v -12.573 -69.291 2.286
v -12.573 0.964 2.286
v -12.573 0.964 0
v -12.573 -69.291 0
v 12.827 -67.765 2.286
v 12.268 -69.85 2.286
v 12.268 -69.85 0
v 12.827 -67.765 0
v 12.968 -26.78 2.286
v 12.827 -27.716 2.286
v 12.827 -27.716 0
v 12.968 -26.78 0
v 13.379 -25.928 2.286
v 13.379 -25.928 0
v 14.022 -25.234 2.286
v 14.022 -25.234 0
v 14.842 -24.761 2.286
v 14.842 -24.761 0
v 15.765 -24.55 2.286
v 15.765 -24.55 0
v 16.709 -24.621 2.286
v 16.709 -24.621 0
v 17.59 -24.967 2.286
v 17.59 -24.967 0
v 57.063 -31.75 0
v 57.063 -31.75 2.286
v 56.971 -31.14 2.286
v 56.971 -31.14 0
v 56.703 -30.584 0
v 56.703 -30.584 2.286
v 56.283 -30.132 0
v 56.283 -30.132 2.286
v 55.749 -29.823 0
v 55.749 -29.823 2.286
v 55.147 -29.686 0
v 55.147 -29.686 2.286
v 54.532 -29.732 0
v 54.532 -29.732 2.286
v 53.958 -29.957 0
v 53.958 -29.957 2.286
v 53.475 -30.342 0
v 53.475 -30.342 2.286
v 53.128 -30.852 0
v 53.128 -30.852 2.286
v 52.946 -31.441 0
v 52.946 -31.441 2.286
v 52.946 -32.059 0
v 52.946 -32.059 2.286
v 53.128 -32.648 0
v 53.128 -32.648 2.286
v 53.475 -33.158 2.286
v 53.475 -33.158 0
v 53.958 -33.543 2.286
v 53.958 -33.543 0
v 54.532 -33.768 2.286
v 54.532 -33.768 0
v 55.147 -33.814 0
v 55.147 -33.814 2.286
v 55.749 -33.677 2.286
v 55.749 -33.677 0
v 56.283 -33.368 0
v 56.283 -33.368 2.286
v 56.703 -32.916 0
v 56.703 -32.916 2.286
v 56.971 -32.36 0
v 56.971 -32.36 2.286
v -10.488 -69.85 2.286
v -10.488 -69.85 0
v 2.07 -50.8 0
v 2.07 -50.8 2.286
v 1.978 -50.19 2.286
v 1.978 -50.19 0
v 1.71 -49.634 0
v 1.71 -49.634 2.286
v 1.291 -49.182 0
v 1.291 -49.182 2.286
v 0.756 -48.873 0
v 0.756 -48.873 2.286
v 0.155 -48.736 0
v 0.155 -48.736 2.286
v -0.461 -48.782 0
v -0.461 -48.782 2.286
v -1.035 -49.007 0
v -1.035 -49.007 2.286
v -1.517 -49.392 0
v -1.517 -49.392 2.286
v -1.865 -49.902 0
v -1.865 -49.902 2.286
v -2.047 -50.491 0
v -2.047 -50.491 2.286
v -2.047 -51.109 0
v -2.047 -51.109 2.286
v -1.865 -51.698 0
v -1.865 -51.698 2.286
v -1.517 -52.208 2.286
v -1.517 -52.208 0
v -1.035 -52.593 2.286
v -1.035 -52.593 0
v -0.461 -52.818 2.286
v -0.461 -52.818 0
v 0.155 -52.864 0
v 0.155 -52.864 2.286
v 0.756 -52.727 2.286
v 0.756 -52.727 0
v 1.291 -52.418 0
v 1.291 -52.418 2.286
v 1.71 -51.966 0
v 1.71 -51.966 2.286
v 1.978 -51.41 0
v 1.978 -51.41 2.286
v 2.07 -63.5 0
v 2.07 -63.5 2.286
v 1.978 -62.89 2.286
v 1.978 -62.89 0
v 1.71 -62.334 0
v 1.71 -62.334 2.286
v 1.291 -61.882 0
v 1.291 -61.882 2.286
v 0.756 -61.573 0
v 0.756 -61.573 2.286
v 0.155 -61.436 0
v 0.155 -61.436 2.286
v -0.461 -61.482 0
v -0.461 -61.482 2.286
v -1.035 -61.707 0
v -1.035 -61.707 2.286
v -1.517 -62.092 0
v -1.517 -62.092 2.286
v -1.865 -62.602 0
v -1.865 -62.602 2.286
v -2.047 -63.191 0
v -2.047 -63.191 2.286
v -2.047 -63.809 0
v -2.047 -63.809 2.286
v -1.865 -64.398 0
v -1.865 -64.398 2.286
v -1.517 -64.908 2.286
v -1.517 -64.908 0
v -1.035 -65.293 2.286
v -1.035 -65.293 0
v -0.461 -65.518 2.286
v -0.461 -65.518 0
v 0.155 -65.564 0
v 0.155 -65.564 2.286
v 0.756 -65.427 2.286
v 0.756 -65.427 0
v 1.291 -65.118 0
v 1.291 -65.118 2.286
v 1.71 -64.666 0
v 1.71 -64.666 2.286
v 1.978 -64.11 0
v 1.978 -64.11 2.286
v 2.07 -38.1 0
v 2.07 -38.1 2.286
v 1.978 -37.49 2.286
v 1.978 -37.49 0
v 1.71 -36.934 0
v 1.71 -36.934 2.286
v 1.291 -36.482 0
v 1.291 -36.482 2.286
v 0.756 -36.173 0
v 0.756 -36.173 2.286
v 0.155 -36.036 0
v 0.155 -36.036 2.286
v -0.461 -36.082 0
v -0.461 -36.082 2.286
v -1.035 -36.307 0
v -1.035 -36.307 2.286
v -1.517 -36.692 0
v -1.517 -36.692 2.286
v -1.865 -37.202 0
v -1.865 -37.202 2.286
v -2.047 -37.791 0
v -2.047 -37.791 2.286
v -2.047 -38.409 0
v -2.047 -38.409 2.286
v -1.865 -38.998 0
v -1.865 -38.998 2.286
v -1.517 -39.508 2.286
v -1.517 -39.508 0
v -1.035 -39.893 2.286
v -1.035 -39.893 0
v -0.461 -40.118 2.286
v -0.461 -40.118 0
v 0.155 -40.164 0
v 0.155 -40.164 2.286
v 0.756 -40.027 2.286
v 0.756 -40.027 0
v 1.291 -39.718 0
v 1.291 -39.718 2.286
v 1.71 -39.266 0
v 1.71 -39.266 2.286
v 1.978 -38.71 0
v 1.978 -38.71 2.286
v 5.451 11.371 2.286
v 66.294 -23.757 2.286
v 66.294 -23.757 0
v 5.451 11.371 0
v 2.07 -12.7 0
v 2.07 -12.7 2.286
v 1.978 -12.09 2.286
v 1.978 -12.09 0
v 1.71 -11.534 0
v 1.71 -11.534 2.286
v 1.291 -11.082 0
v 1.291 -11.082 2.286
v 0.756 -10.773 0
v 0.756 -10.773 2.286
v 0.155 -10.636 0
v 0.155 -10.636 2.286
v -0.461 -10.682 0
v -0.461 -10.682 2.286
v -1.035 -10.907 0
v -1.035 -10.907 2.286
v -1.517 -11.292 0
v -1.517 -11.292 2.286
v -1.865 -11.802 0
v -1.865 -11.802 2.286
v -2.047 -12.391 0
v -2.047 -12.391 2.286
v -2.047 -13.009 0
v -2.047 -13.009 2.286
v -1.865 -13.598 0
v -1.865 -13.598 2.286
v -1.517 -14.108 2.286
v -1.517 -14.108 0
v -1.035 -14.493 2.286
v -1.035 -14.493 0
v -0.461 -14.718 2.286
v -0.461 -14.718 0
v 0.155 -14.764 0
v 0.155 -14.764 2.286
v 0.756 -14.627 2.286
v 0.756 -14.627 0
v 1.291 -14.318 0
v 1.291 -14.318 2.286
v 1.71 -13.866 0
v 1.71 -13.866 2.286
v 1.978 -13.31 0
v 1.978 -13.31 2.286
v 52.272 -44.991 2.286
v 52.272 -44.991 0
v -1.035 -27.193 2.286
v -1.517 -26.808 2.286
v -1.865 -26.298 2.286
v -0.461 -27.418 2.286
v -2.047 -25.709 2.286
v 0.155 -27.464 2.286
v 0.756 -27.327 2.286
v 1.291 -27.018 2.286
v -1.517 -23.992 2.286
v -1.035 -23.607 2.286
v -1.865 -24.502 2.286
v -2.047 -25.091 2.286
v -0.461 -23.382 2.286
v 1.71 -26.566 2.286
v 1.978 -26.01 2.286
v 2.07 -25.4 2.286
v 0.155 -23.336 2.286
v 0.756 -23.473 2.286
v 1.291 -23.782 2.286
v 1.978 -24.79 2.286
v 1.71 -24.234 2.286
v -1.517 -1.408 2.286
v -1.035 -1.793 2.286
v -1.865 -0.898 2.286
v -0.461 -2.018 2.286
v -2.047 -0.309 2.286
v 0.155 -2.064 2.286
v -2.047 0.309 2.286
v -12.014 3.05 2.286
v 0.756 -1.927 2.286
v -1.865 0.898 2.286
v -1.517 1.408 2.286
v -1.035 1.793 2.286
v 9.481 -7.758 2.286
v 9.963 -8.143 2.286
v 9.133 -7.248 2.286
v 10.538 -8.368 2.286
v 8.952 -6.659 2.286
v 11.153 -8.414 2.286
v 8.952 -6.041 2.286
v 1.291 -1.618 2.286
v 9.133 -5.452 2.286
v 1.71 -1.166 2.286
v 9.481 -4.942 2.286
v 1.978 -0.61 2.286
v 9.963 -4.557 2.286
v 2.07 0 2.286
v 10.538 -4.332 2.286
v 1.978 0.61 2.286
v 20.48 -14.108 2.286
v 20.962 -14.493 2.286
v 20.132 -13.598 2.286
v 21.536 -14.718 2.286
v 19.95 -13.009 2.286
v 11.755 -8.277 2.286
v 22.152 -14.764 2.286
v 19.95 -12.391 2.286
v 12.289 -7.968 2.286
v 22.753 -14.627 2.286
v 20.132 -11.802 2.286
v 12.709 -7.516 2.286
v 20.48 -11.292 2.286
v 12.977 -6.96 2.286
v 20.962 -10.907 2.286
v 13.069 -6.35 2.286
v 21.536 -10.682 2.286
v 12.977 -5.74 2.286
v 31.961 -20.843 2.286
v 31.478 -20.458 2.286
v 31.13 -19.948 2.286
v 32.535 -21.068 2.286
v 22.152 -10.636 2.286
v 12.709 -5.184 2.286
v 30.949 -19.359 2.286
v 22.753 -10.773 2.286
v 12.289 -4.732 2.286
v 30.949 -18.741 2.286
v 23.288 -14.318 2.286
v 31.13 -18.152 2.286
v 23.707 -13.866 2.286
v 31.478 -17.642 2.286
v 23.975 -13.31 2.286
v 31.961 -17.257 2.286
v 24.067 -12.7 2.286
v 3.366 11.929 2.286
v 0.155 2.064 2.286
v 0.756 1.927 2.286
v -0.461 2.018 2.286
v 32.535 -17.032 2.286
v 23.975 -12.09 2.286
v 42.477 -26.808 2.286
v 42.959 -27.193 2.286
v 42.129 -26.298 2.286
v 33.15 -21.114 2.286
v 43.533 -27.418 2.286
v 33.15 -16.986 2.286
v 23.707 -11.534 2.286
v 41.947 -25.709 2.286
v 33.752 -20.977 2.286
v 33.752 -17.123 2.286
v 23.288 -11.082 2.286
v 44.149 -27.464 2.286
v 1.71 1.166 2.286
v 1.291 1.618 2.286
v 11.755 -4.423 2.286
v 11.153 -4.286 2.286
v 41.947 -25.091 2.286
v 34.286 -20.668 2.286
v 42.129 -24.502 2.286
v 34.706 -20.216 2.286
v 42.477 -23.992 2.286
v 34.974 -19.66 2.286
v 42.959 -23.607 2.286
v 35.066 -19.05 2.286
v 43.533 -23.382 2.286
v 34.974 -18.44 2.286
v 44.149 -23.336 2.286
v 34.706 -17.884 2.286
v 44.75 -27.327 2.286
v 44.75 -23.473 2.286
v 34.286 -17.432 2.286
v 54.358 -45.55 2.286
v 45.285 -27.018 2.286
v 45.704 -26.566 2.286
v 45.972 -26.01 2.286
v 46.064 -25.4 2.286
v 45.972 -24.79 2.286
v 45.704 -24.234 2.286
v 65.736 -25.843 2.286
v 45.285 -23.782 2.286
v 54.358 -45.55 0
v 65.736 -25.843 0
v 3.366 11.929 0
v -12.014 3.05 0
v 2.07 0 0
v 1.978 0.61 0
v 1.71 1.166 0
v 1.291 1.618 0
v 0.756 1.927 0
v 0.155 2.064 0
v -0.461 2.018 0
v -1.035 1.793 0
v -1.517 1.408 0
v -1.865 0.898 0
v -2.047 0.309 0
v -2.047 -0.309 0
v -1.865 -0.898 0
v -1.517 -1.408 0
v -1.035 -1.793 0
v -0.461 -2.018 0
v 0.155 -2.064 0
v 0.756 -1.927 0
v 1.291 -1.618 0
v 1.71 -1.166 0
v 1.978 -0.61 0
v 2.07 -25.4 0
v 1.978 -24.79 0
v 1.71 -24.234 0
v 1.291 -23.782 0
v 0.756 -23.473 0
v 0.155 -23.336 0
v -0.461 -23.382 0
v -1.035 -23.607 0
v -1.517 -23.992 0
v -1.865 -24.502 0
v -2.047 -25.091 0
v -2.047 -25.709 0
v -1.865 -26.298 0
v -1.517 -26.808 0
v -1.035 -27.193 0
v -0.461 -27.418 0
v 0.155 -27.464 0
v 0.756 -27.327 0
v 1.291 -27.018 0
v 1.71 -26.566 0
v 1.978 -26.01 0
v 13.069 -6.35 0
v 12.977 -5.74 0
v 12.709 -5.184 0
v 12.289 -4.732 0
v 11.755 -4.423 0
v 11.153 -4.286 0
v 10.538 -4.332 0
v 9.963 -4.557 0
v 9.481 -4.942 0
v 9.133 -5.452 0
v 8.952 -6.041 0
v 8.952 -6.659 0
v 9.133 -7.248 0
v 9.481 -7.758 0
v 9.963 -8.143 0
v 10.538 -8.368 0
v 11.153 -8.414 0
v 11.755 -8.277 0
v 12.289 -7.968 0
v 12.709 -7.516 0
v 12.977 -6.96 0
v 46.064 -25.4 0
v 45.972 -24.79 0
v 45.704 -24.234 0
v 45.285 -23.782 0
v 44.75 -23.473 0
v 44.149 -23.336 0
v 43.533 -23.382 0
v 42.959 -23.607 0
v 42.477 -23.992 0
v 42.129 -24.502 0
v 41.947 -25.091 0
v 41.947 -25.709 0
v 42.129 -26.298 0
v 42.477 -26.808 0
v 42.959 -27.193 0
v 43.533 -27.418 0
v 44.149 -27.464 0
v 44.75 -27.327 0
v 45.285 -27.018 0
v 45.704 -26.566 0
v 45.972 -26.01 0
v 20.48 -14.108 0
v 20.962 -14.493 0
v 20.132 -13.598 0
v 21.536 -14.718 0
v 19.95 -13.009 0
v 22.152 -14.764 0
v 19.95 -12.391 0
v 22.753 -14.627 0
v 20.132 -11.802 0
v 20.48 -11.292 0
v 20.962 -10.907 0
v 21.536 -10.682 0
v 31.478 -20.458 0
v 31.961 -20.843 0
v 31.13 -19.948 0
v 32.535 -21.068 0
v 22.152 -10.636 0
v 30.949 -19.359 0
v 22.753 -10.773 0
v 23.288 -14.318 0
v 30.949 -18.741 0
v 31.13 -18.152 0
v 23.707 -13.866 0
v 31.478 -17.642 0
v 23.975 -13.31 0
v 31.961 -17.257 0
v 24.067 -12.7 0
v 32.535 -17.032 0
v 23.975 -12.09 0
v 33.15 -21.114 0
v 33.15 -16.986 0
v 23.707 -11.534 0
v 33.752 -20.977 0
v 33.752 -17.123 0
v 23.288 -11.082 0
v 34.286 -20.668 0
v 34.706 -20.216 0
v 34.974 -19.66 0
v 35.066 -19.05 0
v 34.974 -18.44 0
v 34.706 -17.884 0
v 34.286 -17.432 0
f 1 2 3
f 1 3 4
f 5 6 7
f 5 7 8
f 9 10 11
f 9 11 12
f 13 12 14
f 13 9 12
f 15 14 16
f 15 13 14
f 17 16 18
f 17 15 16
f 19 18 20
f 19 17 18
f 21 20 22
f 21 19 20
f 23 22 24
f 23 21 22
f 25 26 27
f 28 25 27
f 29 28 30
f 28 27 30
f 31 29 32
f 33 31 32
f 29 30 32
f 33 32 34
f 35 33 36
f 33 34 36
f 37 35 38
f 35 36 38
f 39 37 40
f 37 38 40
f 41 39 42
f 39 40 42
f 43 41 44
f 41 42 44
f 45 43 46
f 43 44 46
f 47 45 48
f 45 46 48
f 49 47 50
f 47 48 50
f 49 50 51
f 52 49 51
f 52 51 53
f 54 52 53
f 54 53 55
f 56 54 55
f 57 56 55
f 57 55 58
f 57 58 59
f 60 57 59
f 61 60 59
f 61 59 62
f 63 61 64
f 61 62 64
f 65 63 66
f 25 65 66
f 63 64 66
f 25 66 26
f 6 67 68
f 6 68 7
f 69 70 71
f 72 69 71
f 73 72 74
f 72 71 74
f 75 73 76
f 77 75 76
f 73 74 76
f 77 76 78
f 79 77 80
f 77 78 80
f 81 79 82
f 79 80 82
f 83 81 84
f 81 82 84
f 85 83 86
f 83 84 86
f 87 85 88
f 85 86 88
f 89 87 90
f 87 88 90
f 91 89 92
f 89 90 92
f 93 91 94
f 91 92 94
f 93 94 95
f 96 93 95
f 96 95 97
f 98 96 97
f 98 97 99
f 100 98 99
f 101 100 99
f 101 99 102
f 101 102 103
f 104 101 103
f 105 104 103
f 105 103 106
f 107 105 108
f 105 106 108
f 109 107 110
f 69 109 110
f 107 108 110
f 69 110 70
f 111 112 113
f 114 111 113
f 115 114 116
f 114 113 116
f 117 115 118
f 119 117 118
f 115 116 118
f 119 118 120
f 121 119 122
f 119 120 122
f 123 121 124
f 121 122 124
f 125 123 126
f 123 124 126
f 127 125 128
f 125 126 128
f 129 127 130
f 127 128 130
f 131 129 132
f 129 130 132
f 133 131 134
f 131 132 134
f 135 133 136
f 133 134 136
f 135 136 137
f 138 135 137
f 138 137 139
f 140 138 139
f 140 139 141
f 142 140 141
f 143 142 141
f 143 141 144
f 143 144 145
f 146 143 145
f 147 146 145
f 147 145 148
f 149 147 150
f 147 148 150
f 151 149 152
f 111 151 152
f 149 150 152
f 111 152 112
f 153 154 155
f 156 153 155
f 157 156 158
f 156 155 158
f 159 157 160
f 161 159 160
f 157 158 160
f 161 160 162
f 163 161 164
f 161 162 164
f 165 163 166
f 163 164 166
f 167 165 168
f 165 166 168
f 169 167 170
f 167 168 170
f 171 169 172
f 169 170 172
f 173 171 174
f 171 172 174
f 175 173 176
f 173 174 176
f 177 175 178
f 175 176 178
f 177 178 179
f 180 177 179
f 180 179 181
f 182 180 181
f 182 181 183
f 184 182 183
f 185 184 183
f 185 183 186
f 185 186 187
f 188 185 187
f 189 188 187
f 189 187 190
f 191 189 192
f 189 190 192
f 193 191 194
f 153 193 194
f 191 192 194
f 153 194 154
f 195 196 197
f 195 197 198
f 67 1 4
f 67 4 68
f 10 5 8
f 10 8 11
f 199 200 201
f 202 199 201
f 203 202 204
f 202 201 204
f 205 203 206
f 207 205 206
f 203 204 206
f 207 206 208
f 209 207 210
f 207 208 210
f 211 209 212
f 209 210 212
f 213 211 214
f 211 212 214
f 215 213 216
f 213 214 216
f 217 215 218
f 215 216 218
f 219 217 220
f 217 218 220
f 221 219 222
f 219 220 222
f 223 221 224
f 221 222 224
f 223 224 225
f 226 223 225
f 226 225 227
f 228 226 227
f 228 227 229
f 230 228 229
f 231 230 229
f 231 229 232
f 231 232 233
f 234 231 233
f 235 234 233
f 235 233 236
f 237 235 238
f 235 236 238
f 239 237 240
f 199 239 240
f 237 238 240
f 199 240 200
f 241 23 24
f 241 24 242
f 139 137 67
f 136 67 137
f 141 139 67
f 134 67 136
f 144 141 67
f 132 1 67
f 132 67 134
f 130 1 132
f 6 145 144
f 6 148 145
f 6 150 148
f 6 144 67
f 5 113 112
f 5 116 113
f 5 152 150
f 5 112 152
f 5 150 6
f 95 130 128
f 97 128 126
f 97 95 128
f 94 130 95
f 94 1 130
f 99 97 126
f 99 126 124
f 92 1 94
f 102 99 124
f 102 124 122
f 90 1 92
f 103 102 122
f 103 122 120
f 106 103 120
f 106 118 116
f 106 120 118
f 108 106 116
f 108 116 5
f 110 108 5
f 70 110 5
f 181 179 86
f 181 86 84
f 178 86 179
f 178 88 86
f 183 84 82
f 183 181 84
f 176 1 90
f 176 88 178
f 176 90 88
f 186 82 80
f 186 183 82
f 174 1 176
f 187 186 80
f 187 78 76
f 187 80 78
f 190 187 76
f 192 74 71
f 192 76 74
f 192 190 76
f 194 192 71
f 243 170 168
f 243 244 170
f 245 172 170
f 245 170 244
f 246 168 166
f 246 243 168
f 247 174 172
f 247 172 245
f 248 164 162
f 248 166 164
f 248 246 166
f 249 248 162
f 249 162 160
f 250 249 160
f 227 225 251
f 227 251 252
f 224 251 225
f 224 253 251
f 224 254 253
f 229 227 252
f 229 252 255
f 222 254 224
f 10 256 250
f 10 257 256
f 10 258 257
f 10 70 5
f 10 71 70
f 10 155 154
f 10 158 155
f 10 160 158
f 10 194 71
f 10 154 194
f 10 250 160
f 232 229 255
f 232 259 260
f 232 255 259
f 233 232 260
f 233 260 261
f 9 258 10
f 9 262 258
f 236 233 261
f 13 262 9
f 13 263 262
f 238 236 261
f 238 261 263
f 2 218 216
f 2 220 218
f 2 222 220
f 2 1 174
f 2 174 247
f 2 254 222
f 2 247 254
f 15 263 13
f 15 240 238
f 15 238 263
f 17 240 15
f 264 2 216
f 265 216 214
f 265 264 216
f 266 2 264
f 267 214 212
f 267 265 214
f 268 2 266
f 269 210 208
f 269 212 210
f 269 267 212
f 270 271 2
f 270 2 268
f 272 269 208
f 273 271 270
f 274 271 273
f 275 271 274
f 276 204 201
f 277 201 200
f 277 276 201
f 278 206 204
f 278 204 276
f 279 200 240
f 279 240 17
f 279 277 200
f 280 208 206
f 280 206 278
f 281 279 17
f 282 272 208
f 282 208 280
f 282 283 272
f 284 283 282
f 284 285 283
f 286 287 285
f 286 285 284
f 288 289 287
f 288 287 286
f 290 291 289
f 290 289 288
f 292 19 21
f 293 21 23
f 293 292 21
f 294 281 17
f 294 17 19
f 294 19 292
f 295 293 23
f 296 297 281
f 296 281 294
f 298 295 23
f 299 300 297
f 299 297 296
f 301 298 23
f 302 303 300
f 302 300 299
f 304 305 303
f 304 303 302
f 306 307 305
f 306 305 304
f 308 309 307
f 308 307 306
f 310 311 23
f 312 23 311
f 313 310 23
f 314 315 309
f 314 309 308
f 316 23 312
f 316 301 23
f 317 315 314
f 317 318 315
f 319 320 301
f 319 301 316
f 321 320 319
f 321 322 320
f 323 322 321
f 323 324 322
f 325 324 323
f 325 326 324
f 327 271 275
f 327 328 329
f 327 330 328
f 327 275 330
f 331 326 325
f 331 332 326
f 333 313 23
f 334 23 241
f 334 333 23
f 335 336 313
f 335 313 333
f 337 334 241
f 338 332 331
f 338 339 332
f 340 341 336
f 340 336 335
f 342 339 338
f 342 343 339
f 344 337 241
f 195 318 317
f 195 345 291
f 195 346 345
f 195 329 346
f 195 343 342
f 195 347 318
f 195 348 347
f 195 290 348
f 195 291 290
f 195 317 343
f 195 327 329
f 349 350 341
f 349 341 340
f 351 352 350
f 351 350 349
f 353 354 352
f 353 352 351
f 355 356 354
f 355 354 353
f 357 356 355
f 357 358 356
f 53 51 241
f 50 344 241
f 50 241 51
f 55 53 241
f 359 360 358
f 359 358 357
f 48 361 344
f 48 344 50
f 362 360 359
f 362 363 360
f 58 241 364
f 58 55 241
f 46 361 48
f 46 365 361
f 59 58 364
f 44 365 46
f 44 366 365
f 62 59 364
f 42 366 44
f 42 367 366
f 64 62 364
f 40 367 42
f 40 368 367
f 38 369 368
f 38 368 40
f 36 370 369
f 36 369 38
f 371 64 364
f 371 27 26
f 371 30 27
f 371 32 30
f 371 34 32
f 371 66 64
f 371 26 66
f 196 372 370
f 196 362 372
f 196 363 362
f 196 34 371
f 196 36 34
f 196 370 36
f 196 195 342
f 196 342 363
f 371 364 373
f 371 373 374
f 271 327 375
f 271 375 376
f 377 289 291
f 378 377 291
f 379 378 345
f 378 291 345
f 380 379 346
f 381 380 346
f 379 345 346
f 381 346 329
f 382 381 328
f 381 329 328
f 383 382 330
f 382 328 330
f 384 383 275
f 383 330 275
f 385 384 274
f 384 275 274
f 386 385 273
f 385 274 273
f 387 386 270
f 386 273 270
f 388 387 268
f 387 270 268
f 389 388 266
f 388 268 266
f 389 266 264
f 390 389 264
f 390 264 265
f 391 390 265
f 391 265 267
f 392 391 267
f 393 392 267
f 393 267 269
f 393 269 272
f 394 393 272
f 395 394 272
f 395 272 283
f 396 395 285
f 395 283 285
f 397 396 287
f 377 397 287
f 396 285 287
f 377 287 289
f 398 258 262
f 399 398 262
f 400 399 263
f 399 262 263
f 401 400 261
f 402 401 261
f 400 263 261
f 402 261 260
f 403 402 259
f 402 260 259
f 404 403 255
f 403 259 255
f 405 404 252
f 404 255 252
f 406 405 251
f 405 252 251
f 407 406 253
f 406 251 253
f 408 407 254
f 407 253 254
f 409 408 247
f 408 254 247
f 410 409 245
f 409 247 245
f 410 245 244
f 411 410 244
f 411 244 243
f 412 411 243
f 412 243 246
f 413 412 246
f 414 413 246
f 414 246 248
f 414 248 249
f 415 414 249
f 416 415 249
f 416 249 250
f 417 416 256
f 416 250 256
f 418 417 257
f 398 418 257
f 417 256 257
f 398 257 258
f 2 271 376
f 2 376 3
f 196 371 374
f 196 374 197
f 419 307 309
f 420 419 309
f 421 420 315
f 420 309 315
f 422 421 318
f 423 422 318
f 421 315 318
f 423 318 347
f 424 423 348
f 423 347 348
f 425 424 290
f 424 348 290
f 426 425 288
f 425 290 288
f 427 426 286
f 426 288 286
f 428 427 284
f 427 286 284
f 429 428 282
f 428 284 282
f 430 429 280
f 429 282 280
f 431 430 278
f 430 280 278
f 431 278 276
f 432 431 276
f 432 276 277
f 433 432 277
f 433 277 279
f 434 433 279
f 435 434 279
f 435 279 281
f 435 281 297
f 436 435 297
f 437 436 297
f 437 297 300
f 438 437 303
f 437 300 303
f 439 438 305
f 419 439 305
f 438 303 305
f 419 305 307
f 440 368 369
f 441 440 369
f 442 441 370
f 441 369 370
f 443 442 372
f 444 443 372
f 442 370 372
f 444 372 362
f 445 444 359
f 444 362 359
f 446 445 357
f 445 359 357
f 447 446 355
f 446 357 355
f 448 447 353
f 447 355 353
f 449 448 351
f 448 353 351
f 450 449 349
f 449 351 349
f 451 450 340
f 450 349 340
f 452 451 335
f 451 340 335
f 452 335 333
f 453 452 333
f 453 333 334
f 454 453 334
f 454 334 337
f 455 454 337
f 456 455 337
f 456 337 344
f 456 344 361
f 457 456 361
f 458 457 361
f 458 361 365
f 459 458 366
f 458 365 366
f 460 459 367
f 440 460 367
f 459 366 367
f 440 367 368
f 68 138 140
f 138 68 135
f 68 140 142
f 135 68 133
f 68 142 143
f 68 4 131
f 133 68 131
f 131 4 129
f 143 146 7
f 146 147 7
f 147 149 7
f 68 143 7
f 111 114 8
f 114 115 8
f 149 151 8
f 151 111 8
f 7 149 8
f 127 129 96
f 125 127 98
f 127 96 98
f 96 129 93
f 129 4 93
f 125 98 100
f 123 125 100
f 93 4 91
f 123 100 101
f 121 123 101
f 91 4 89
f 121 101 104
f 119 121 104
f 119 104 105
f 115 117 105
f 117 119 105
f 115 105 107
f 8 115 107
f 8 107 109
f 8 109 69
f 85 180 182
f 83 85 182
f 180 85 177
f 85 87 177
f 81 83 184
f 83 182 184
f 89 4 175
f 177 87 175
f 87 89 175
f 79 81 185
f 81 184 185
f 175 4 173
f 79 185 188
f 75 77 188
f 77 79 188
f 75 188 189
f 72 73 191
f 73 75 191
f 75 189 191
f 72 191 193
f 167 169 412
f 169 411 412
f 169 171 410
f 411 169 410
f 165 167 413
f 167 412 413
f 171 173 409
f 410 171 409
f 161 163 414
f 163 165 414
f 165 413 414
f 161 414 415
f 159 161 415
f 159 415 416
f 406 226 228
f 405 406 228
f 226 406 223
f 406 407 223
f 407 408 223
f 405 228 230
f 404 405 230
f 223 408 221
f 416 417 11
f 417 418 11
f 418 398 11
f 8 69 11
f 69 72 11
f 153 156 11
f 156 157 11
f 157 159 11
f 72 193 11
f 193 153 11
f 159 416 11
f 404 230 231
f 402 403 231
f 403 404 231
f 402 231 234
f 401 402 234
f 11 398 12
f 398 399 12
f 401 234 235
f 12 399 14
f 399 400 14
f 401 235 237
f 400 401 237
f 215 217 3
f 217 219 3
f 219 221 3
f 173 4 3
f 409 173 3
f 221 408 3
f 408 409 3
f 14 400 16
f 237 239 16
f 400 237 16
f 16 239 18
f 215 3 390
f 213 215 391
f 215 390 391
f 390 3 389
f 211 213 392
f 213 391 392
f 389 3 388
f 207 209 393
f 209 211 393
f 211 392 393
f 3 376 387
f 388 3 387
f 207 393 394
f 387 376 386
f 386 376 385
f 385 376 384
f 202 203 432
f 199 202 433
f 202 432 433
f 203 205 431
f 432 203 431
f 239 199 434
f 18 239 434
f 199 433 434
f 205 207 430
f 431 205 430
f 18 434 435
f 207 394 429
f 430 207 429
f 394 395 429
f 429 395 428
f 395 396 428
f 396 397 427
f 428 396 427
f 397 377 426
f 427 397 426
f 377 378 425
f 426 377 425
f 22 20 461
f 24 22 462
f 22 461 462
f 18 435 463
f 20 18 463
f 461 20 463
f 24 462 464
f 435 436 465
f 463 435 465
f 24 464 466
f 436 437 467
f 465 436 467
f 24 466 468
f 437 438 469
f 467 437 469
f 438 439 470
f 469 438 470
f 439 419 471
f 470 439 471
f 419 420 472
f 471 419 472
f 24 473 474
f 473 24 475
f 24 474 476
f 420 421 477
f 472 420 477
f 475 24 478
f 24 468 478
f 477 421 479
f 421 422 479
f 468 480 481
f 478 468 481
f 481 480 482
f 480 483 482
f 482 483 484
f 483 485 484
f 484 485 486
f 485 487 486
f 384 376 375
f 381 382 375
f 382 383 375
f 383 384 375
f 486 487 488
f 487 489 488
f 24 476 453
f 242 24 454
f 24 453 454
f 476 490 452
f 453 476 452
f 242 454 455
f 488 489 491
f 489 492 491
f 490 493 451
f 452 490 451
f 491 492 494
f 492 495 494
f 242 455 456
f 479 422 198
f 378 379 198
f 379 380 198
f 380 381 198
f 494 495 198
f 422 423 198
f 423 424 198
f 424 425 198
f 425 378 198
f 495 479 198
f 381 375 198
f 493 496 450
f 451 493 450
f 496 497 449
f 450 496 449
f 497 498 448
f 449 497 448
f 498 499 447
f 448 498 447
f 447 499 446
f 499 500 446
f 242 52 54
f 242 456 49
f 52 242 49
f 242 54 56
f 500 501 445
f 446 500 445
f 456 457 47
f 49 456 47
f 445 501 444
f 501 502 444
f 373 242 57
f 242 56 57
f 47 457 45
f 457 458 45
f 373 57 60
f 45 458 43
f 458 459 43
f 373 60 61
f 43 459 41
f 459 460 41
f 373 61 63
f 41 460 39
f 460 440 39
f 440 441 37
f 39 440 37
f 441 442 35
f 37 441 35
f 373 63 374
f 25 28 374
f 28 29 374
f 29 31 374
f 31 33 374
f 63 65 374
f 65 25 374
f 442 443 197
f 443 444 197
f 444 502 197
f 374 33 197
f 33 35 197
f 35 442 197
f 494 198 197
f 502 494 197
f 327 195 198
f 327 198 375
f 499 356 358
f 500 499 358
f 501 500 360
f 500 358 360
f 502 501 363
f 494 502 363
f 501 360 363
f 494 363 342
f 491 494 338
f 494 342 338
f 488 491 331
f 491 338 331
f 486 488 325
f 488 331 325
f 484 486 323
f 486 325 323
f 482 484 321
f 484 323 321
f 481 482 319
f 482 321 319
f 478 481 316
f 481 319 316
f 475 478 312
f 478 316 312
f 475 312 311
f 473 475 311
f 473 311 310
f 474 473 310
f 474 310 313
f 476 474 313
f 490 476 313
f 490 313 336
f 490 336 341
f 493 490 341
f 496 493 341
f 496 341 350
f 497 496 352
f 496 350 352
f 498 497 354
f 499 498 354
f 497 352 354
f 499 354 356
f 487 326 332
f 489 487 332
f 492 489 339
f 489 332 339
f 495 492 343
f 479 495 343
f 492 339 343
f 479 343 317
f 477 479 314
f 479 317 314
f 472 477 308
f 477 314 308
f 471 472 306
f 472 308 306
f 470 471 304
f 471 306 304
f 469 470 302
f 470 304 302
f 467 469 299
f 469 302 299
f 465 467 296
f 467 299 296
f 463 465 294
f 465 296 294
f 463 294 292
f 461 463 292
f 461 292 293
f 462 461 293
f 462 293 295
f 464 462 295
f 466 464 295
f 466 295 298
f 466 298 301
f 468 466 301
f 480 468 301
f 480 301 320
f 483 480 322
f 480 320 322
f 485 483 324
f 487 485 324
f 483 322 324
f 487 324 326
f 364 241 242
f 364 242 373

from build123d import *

# Parameters (mm, degrees)
SKETCH1_R           = 2.0701
BOSS_EXTRUDE1_DEPTH = 2.286


with BuildPart() as part:
    # Sketch1 → Boss-Extrude1 (new body)
    with BuildSketch(Plane.XY.offset(2.286)):
        with BuildLine():
            Line((17.5895, -24.966646366), (52.272335755, -44.990790925))
            Line((52.272335755, -44.990790925), (54.357769614, -45.549581243))
            Line((54.357769614, -45.549581243), (65.735657525, -25.842501298))
            Line((65.735657525, -25.842501298), (66.294447843, -23.757067439))
            Line((66.294447843, -23.757067439), (5.451427483, 11.370666744))
            Line((5.451427483, 11.370666744), (3.365993624, 11.929457063))
            Line((3.365993624, 11.929457063), (-12.014209682, 3.049692544))
            Line((-12.014209682, 3.049692544), (-12.573, 0.964258685))
            Line((-12.573, 0.964258685), (-12.573, -69.291209682))
            Line((-12.573, -69.291209682), (-10.487566141, -69.85))
            Line((-10.487566141, -69.85), (12.268209682, -69.85))
            Line((12.268209682, -69.85), (12.827, -67.764566141))
            Line((12.827, -67.764566141), (12.827, -27.716277023))
            ThreePointArc((12.827, -27.716277023), (14.4145, -24.966646366), (17.5895, -24.966646366))
        make_face()
        with Locations((54.99261314, -31.75)):
            Circle(SKETCH1_R, mode=Mode.SUBTRACT)
        with Locations((32.995567884, -19.05)):
            Circle(SKETCH1_R, mode=Mode.SUBTRACT)
        with Locations((0, -50.8)):
            Circle(SKETCH1_R, mode=Mode.SUBTRACT)
        with Locations((0, -25.4)):
            Circle(SKETCH1_R, mode=Mode.SUBTRACT)
        with Locations((10.998522628, -6.35)):
            Circle(SKETCH1_R, mode=Mode.SUBTRACT)
        Circle(SKETCH1_R, mode=Mode.SUBTRACT)
        with Locations((0, -12.7)):
            Circle(SKETCH1_R, mode=Mode.SUBTRACT)
        with Locations((0, -38.1)):
            Circle(SKETCH1_R, mode=Mode.SUBTRACT)
        with Locations((21.997045256, -12.7)):
            Circle(SKETCH1_R, mode=Mode.SUBTRACT)
        with Locations((43.994090512, -25.4)):
            Circle(SKETCH1_R, mode=Mode.SUBTRACT)
        with Locations((0, -63.5)):
            Circle(SKETCH1_R, mode=Mode.SUBTRACT)
    extrude(amount=-BOSS_EXTRUDE1_DEPTH)


solid = part.part
